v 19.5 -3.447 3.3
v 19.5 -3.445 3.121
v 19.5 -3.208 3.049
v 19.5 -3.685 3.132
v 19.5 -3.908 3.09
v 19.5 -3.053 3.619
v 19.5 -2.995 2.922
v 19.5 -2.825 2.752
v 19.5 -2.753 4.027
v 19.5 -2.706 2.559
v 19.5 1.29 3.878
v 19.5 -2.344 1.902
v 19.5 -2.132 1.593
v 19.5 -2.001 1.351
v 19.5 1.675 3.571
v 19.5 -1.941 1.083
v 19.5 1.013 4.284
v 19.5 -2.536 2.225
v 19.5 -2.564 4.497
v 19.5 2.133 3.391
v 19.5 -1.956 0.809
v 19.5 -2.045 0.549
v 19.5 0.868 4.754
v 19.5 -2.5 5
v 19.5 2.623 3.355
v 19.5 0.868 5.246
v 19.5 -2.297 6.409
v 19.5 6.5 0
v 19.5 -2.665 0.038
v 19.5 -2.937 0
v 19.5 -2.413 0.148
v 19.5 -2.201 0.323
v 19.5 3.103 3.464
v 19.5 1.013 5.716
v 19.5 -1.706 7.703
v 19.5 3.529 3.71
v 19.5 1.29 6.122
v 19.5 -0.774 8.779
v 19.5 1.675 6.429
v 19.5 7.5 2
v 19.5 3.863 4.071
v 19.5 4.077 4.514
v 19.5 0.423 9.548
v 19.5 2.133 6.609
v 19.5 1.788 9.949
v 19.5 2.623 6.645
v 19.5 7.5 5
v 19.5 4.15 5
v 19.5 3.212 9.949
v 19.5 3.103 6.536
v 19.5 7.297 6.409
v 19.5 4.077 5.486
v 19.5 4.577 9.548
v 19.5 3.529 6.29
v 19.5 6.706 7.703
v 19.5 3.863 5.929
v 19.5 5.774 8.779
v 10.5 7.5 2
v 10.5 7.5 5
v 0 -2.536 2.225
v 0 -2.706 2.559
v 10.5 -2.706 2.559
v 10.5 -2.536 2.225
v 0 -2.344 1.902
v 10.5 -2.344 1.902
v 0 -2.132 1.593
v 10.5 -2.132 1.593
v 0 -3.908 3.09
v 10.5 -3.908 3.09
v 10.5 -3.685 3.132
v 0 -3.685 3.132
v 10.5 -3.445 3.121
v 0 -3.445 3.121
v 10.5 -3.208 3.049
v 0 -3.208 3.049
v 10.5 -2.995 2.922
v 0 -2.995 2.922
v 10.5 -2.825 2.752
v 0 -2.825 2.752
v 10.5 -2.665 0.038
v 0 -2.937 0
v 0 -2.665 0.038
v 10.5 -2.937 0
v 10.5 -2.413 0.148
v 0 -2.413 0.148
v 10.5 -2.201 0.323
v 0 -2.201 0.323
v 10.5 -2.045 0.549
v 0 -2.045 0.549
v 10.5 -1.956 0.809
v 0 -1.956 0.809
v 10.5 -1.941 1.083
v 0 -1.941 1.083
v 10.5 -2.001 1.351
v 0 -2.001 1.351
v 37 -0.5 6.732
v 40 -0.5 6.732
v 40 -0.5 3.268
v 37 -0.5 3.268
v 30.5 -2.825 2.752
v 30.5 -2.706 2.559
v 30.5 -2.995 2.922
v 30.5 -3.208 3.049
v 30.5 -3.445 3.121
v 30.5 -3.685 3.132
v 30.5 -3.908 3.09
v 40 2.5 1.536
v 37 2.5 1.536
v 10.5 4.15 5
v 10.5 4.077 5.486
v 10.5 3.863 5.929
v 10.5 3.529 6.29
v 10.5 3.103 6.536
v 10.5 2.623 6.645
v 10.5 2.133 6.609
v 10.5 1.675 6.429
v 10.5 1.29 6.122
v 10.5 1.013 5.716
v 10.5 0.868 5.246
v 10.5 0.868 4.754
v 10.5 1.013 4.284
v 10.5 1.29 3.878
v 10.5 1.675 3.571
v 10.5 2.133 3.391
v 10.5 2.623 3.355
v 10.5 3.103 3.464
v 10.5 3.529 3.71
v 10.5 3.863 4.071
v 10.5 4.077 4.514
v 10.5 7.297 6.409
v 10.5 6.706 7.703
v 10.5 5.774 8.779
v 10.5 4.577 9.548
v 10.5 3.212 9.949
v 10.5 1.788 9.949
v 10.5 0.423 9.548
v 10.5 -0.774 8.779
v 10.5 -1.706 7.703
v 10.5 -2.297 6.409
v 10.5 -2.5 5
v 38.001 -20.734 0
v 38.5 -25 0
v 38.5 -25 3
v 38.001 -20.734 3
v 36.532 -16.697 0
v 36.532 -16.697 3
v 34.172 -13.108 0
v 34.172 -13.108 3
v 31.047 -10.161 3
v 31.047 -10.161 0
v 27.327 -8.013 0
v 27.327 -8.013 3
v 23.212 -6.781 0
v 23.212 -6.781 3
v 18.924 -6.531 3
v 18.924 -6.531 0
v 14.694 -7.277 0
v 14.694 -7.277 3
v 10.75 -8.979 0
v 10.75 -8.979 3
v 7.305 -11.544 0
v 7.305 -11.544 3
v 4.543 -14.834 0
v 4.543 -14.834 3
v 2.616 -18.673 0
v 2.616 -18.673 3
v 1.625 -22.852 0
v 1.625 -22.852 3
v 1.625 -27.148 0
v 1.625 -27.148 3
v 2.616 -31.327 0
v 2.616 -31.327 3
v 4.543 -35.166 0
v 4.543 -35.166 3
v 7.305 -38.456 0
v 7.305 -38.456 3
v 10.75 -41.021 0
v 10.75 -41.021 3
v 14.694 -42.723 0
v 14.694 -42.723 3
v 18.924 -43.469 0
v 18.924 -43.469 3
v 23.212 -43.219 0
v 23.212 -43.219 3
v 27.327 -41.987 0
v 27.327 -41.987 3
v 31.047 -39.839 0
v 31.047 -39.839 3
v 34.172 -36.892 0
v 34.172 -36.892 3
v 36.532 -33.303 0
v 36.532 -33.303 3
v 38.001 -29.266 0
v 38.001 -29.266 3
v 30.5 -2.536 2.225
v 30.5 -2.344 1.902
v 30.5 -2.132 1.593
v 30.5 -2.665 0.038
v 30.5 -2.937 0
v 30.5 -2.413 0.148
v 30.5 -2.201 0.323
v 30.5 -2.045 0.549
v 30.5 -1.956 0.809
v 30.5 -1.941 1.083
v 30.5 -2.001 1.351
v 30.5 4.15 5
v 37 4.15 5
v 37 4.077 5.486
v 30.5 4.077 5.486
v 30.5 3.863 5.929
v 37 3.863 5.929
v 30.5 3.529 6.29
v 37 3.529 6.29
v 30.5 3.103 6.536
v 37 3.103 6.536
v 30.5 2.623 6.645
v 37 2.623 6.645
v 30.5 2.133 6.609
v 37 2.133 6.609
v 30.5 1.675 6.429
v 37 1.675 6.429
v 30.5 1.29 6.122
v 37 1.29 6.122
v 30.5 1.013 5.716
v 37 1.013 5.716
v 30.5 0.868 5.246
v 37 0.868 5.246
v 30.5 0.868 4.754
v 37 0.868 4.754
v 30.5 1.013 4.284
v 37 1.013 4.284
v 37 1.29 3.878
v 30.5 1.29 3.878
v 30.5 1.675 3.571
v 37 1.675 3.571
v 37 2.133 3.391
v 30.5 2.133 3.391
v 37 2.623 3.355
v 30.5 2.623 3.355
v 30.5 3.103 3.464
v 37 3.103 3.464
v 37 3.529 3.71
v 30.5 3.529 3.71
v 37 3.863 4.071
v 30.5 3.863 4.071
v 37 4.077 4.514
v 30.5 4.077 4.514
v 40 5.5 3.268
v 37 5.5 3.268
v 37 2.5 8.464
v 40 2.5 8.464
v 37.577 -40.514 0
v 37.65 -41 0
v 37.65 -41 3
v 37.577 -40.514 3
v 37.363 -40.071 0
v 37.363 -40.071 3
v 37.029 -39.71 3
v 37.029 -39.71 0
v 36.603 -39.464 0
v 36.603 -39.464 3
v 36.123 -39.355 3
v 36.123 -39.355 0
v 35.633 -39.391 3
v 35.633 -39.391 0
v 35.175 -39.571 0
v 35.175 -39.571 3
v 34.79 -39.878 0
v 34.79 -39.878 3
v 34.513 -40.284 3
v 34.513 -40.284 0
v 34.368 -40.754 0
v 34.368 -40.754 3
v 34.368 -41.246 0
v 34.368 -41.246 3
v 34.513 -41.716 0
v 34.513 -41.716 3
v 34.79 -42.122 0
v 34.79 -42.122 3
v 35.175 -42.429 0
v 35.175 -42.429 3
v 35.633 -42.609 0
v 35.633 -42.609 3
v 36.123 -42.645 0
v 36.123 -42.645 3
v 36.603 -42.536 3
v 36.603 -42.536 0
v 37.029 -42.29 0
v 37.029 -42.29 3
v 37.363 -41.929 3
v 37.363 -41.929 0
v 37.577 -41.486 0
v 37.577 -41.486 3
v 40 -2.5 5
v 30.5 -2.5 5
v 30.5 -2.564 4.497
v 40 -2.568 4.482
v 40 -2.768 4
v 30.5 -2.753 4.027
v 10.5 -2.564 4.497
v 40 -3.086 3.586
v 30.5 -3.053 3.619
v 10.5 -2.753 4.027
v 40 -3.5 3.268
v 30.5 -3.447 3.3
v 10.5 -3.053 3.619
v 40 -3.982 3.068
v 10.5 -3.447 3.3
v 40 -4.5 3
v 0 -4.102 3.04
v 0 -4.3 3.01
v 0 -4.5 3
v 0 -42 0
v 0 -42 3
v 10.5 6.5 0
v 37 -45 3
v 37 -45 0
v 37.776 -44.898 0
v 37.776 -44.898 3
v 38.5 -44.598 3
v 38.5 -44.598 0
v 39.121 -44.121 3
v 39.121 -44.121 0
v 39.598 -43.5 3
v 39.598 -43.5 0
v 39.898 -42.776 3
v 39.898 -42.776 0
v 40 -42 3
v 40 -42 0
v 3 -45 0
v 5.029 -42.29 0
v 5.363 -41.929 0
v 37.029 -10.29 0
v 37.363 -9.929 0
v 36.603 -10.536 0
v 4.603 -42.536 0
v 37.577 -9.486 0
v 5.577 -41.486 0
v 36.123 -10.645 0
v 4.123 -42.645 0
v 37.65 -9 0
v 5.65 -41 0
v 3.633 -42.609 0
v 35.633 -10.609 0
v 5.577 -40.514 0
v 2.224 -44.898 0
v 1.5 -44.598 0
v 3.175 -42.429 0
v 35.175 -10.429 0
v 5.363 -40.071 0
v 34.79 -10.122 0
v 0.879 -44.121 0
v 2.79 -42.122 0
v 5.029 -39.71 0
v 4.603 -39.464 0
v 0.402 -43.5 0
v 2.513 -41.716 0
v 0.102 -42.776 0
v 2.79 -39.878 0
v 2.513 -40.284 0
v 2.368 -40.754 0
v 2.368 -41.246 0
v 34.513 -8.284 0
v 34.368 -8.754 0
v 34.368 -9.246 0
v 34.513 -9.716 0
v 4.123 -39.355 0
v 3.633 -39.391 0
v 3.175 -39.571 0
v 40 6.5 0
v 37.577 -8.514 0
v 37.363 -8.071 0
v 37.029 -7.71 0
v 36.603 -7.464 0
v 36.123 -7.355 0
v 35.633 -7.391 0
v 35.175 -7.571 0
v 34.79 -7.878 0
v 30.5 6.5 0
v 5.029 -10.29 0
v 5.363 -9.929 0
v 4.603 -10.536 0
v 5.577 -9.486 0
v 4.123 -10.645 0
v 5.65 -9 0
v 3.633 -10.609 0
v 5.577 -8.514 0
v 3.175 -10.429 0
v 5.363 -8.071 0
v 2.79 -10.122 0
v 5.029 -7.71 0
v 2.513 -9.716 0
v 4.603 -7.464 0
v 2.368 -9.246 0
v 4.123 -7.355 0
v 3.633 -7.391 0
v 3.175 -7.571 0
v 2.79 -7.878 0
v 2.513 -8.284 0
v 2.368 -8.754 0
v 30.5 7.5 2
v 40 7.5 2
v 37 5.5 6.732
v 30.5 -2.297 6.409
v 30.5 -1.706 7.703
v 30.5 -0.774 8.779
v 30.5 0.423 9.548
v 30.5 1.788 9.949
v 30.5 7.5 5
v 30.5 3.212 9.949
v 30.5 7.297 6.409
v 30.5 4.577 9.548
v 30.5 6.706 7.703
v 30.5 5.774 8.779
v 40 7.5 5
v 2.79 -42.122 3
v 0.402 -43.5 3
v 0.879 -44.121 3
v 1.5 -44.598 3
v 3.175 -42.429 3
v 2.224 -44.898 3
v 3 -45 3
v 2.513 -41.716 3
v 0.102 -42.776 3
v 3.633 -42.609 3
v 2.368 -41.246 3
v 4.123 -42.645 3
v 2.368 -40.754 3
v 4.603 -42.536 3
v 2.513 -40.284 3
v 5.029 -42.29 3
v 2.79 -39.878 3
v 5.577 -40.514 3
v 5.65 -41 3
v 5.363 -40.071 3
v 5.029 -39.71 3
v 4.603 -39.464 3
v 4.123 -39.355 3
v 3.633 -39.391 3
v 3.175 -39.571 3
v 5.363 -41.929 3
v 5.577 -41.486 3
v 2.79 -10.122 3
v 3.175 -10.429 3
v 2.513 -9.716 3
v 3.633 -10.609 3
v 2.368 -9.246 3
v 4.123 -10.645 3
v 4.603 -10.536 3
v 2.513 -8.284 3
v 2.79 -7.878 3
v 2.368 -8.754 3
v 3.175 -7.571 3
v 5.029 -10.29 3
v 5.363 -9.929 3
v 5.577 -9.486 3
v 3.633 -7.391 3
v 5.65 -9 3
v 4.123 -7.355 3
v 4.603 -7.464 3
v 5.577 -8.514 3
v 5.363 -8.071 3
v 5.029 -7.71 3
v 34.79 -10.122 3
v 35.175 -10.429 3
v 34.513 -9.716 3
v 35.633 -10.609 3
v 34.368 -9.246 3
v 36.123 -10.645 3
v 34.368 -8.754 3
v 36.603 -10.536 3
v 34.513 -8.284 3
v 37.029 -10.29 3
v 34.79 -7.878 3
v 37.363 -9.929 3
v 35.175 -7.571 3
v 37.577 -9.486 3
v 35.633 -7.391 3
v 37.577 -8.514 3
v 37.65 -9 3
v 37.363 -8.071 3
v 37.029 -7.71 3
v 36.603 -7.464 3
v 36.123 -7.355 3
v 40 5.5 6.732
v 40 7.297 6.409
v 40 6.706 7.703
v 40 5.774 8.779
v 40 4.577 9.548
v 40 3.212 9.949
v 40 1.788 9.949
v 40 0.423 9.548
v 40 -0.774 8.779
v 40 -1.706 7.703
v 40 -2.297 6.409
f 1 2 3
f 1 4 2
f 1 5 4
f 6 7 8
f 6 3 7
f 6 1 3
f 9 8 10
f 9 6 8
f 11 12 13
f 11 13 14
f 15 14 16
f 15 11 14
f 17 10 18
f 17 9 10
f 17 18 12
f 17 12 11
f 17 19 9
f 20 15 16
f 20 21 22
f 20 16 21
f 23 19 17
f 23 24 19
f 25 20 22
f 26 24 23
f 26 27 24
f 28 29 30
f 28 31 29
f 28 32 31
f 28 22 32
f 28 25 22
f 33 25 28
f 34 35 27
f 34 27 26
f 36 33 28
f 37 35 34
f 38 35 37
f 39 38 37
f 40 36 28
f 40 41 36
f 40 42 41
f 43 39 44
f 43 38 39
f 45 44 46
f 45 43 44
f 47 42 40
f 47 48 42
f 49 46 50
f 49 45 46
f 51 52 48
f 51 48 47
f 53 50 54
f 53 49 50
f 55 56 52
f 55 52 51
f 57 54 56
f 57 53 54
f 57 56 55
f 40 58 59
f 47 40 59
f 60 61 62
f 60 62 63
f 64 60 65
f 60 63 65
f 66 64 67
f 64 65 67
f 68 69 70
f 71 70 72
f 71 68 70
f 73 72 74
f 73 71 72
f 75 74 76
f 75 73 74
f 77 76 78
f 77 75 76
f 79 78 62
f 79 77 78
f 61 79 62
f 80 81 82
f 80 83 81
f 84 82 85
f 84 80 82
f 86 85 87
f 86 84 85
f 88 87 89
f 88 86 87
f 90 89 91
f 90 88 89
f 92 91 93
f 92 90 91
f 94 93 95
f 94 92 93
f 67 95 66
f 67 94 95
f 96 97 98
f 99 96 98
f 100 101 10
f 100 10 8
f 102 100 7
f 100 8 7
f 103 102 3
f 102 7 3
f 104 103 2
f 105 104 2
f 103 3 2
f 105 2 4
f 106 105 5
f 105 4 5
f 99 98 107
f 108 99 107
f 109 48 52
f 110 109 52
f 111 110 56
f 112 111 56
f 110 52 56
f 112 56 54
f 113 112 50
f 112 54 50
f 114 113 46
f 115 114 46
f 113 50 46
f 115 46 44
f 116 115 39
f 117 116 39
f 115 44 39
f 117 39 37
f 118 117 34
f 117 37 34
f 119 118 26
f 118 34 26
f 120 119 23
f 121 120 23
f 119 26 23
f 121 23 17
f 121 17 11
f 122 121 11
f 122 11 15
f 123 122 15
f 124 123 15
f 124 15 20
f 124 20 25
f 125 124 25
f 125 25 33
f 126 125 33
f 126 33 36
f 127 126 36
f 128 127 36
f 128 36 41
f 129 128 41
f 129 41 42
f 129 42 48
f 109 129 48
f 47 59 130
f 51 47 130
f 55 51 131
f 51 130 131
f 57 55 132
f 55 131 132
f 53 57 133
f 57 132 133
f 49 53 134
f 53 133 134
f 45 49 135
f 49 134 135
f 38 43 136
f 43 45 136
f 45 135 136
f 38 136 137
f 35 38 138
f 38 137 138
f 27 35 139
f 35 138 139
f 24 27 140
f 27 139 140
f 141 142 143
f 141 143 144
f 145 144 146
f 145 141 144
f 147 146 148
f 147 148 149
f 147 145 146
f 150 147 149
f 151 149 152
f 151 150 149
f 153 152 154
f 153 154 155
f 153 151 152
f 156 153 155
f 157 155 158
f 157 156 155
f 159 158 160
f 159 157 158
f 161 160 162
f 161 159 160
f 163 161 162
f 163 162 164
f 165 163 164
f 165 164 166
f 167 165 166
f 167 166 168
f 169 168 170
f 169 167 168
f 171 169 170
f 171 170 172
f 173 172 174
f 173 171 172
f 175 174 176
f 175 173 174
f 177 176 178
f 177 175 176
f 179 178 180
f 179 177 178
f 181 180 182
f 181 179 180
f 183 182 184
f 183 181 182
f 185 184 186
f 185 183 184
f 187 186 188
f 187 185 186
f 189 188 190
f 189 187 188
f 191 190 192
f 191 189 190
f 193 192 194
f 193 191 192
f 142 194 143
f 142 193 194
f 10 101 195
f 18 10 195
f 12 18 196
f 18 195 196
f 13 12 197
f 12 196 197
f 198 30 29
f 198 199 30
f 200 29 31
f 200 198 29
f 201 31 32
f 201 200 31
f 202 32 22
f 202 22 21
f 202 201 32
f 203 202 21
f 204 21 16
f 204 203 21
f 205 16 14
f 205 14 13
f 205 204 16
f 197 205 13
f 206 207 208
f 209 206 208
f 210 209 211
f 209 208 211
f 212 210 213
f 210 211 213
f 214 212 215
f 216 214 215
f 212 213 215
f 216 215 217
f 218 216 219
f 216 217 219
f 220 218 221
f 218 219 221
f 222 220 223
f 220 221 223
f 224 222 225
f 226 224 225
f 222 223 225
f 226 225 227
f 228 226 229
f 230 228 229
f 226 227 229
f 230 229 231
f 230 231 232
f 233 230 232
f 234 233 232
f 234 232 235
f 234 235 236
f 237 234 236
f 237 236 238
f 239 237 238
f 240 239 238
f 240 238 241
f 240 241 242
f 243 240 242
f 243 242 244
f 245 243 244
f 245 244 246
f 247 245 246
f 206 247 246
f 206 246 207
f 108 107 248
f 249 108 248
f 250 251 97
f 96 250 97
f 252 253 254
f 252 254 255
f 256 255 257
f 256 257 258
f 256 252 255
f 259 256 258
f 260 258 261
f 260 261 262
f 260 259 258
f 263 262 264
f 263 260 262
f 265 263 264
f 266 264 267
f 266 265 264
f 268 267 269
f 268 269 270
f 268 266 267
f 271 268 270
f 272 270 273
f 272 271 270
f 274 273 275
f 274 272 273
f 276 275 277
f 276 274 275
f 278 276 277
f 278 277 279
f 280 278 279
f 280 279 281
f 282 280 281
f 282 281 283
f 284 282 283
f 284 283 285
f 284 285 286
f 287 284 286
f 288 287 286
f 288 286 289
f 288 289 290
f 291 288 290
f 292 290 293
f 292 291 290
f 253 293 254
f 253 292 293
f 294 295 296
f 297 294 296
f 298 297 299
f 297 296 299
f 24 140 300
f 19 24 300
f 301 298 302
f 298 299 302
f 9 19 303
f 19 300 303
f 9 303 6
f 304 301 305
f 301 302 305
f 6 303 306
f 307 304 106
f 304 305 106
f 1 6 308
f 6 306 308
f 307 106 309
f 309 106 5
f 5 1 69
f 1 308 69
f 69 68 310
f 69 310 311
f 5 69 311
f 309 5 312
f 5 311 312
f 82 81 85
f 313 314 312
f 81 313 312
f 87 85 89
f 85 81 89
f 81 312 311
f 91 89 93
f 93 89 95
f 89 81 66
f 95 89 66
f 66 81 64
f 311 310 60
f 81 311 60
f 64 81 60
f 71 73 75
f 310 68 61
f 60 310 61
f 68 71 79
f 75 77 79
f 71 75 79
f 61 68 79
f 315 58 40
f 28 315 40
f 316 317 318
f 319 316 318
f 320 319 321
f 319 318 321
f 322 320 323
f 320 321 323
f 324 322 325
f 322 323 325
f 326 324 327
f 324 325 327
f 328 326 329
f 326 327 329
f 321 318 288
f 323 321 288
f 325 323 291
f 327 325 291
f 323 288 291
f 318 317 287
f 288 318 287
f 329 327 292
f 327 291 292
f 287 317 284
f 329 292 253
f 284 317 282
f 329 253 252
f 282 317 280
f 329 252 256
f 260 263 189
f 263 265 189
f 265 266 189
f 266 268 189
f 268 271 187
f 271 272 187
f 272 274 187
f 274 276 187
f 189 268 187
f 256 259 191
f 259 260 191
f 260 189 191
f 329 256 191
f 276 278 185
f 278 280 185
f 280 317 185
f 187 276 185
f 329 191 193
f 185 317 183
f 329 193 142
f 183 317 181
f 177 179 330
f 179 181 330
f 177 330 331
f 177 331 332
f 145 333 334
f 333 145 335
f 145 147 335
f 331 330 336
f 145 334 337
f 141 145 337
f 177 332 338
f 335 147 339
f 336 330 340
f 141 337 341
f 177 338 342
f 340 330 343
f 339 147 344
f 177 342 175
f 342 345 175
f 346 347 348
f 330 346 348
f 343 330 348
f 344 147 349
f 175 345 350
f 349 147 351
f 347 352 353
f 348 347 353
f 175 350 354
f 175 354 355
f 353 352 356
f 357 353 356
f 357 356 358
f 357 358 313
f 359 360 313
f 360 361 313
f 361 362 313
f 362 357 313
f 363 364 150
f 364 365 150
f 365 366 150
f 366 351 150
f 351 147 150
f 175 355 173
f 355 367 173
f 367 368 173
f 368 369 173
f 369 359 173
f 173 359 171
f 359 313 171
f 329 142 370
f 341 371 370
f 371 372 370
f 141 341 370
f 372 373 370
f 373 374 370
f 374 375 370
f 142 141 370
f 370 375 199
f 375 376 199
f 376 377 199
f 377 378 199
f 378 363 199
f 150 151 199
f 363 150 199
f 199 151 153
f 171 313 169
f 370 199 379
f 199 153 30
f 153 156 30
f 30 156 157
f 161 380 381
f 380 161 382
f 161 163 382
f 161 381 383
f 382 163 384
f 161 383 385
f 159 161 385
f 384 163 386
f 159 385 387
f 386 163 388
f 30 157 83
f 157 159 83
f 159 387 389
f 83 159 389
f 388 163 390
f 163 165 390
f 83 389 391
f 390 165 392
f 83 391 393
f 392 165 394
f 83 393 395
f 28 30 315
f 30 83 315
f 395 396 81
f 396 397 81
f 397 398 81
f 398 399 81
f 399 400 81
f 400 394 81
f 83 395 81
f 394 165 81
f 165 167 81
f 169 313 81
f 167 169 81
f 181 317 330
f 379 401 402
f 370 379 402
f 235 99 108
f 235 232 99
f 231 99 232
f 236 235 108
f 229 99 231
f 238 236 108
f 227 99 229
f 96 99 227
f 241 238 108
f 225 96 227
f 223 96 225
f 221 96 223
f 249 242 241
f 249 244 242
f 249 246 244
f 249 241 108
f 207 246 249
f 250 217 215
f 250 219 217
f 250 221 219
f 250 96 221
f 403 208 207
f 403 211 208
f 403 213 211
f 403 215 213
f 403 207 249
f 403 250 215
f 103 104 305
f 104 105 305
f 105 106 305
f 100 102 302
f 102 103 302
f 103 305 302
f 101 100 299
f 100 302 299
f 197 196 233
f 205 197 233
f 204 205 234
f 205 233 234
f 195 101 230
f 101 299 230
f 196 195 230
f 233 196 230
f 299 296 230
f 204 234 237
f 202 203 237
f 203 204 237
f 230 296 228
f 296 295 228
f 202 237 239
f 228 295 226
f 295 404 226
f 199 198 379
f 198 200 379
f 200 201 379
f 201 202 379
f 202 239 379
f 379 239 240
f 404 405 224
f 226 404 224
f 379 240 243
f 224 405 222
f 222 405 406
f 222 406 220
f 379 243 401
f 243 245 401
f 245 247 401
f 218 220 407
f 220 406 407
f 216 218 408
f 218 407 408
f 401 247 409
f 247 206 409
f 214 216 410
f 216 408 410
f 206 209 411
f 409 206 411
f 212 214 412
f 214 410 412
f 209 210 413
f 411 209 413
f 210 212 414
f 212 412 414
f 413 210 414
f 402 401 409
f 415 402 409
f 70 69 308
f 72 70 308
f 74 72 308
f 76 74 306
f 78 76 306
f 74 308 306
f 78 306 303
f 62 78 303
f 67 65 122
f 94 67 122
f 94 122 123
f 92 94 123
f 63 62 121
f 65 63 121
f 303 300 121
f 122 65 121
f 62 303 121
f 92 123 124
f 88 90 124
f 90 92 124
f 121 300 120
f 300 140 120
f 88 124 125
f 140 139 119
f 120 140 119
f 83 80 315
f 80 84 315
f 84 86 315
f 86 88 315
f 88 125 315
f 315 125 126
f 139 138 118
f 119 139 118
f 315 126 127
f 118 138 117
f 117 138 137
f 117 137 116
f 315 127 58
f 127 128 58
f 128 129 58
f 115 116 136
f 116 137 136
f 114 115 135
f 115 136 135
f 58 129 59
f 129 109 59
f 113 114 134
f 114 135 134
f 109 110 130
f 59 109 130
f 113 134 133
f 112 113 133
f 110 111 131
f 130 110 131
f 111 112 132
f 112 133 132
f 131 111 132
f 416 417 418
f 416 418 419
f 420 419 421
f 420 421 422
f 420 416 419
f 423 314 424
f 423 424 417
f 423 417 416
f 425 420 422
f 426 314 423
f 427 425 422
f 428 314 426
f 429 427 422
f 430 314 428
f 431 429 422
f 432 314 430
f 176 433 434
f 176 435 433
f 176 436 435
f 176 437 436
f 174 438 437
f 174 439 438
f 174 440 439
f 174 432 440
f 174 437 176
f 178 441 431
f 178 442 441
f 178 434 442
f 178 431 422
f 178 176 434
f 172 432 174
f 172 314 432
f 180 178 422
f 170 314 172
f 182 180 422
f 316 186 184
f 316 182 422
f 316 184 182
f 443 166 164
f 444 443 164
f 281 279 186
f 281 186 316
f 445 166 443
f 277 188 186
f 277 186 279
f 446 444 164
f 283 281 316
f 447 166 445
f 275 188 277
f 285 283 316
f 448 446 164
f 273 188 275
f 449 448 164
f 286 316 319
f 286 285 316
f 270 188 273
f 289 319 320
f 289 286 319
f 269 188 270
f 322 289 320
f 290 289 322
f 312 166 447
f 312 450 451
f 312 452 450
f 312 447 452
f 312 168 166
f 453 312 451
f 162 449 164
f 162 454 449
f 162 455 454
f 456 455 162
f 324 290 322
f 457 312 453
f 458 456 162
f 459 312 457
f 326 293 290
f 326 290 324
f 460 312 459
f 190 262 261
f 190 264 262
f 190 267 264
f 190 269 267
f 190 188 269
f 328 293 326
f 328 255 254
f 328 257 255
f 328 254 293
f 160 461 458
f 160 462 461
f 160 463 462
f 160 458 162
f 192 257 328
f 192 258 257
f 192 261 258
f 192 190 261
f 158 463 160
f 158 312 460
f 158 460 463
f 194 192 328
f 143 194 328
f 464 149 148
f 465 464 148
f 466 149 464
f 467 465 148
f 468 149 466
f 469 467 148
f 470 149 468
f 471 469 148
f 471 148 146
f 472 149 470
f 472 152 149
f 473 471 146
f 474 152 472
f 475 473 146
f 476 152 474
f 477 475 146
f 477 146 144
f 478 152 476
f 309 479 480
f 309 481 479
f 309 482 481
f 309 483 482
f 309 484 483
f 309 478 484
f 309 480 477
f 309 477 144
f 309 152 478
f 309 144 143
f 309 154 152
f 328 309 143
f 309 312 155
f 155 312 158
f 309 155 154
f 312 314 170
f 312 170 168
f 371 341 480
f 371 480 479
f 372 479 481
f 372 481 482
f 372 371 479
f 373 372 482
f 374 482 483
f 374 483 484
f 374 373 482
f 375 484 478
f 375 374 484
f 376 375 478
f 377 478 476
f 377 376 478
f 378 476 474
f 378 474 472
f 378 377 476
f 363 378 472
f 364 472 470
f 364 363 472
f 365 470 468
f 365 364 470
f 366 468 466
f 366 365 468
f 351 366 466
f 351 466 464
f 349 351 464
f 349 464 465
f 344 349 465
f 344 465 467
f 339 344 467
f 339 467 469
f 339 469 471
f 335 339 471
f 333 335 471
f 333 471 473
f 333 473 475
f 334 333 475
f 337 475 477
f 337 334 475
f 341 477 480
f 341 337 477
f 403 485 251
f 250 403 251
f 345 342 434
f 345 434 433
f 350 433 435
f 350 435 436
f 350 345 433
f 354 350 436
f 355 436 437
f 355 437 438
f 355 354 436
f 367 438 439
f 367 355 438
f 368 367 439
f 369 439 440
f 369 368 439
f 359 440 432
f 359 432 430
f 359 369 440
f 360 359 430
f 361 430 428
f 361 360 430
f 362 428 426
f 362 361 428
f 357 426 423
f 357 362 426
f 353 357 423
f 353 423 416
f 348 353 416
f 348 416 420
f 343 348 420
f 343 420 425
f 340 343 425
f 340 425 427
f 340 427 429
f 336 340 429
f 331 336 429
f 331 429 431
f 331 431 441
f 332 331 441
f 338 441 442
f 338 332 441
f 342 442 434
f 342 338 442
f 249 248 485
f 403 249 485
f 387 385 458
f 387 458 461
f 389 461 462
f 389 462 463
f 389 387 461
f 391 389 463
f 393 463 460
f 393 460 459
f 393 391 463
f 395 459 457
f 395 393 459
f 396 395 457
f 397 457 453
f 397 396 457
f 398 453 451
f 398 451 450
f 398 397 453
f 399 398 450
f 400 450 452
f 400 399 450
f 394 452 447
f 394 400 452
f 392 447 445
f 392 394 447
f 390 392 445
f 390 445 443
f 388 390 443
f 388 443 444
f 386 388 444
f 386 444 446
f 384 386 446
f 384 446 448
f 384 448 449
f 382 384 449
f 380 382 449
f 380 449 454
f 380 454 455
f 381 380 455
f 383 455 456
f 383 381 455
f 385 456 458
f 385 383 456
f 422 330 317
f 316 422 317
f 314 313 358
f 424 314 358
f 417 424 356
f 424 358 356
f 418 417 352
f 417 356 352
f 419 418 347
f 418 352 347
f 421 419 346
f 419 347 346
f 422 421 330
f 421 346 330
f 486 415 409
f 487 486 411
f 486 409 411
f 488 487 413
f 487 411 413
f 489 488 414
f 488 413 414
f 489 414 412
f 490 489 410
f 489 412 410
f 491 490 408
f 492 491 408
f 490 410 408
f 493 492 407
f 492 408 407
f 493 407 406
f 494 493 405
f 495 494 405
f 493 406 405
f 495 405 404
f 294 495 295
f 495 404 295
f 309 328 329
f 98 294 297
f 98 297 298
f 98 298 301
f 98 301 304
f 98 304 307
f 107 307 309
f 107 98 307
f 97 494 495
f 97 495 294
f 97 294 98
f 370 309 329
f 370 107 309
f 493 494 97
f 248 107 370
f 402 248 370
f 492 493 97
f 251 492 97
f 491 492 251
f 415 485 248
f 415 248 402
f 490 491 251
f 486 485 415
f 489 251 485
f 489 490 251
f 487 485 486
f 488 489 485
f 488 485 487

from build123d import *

# Parameters (mm, degrees)
F0_R      = 1.65
F0_R_2    = 18.5
F1_DEPTH  = 3
F3_DEPTH  = 40
F4_R      = 1.65
F5_DEPTH  = 40.001
F7_DEPTH  = 3
F8_R      = 1.99999
F11_DEPTH = 11
F14_DEPTH = 10.501
F15_SIZE2 = 2
F15_SIZE  = 1
F16_R     = 1


# Not quite as in the source:
# - a fillet or chamfer is up to 0.001 mm smaller than in the source, because OpenCascade refuses the exact size


with BuildPart() as f1:
    # F0 (on Top) → F1 (new body)
    with BuildSketch(Plane.XY):
        with BuildLine():
            Line((40, 0), (0, 0))
            Line((0, 0), (0, -42))
            ThreePointArc((0, -42), (0.8786796564, -44.1213203436), (3, -45))
            Line((3, -45), (37, -45))
            ThreePointArc((37, -45), (39.1213203436, -44.1213203436), (40, -42))
            Line((40, -42), (40, 0))
        make_face()
        with Locations((4, -41)):
            Circle(F0_R, mode=Mode.SUBTRACT)
        with Locations((36, -41)):
            Circle(F0_R, mode=Mode.SUBTRACT)
        with Locations((20, -25)):
            Circle(F0_R_2, mode=Mode.SUBTRACT)
        with Locations((4, -9)):
            Circle(F0_R, mode=Mode.SUBTRACT)
        with Locations((36, -9)):
            Circle(F0_R, mode=Mode.SUBTRACT)
    extrude(amount=F1_DEPTH)

    # F2 (on Right) → F3 (join)
    with BuildSketch(Plane.YZ):
        with BuildLine():
            Line((-2.5, 5), (-2.5, 0))
            Line((-2.5, 0), (7.5, 0))
            Line((7.5, 0), (7.5, 5))
            ThreePointArc((7.5, 5), (2.5, 10), (-2.5, 5))
        make_face()
    extrude(amount=F3_DEPTH)

    # F4 (on face) → F5 (cut, through all)
    with BuildSketch(Plane.YZ.offset(40)):
        with Locations((2.5, 5)):
            Circle(F4_R)
    extrude(amount=-F5_DEPTH, mode=Mode.SUBTRACT)

    # F6 (on face) → F7 (cut)
    with BuildSketch(Plane.YZ.offset(40)):
        Polygon((5.5, 3.2679491924), (5.5, 6.7320508076), (2.5, 8.4641016151), (-0.5, 6.7320508076), (-0.5, 3.2679491924), (2.5, 1.5358983849), align=None)
    extrude(amount=-F7_DEPTH, mode=Mode.SUBTRACT)

    # F8 (radius 2 in the source; OpenCascade refuses exactly that, so slightly less here)
    f8_edges = [f1.edges().sort_by_distance(p)[0] for p in [
        (20, -2.5, 3),
    ]]
    fillet(f8_edges, radius=F8_R)

    # F10 (on offset) → F11 (cut)
    with BuildSketch(Plane.YZ.offset(30.5)):
        with BuildLine():
            Line((8.25, -0.75), (8.25, 5))
            ThreePointArc((8.25, 5), (-1.5658639918, 9.0658639918), (2.5, -0.75))
            Line((2.5, -0.75), (8.25, -0.75))
        make_face()
    extrude(amount=-F11_DEPTH, mode=Mode.SUBTRACT)

    # F13 (on offset) → F14 (cut, through all)
    with BuildSketch(Plane.YZ.offset(10.5)):
        with BuildLine():
            Line((8.25, -0.75), (8.25, 5))
            ThreePointArc((8.25, 5), (-1.5658639918, 9.0658639918), (2.5, -0.75))
            Line((2.5, -0.75), (8.25, -0.75))
        make_face()
    extrude(amount=-F14_DEPTH, mode=Mode.SUBTRACT)

    # F15
    f15_edges = [f1.edges().sort_by_distance(p)[0] for p in [
        (35.25, 7.5, 0),
        (15, 7.5, 0),
    ]]
    f15_side = f1.faces().sort_by_distance((15, 6.839981, 0))[0]
    chamfer(f15_edges, length=F15_SIZE, length2=F15_SIZE2, reference=f15_side)

    # F16
    f16_edges = [f1.edges().sort_by_distance(p)[0] for p in [
        (25, -3.075892, 3.595745),
        (25, -0.339454, 0),
        (5.25, -3.075892, 3.595745),
        (5.25, -0.339454, 0),
    ]]
    fillet(f16_edges, radius=F16_R)


solid = f1.part
